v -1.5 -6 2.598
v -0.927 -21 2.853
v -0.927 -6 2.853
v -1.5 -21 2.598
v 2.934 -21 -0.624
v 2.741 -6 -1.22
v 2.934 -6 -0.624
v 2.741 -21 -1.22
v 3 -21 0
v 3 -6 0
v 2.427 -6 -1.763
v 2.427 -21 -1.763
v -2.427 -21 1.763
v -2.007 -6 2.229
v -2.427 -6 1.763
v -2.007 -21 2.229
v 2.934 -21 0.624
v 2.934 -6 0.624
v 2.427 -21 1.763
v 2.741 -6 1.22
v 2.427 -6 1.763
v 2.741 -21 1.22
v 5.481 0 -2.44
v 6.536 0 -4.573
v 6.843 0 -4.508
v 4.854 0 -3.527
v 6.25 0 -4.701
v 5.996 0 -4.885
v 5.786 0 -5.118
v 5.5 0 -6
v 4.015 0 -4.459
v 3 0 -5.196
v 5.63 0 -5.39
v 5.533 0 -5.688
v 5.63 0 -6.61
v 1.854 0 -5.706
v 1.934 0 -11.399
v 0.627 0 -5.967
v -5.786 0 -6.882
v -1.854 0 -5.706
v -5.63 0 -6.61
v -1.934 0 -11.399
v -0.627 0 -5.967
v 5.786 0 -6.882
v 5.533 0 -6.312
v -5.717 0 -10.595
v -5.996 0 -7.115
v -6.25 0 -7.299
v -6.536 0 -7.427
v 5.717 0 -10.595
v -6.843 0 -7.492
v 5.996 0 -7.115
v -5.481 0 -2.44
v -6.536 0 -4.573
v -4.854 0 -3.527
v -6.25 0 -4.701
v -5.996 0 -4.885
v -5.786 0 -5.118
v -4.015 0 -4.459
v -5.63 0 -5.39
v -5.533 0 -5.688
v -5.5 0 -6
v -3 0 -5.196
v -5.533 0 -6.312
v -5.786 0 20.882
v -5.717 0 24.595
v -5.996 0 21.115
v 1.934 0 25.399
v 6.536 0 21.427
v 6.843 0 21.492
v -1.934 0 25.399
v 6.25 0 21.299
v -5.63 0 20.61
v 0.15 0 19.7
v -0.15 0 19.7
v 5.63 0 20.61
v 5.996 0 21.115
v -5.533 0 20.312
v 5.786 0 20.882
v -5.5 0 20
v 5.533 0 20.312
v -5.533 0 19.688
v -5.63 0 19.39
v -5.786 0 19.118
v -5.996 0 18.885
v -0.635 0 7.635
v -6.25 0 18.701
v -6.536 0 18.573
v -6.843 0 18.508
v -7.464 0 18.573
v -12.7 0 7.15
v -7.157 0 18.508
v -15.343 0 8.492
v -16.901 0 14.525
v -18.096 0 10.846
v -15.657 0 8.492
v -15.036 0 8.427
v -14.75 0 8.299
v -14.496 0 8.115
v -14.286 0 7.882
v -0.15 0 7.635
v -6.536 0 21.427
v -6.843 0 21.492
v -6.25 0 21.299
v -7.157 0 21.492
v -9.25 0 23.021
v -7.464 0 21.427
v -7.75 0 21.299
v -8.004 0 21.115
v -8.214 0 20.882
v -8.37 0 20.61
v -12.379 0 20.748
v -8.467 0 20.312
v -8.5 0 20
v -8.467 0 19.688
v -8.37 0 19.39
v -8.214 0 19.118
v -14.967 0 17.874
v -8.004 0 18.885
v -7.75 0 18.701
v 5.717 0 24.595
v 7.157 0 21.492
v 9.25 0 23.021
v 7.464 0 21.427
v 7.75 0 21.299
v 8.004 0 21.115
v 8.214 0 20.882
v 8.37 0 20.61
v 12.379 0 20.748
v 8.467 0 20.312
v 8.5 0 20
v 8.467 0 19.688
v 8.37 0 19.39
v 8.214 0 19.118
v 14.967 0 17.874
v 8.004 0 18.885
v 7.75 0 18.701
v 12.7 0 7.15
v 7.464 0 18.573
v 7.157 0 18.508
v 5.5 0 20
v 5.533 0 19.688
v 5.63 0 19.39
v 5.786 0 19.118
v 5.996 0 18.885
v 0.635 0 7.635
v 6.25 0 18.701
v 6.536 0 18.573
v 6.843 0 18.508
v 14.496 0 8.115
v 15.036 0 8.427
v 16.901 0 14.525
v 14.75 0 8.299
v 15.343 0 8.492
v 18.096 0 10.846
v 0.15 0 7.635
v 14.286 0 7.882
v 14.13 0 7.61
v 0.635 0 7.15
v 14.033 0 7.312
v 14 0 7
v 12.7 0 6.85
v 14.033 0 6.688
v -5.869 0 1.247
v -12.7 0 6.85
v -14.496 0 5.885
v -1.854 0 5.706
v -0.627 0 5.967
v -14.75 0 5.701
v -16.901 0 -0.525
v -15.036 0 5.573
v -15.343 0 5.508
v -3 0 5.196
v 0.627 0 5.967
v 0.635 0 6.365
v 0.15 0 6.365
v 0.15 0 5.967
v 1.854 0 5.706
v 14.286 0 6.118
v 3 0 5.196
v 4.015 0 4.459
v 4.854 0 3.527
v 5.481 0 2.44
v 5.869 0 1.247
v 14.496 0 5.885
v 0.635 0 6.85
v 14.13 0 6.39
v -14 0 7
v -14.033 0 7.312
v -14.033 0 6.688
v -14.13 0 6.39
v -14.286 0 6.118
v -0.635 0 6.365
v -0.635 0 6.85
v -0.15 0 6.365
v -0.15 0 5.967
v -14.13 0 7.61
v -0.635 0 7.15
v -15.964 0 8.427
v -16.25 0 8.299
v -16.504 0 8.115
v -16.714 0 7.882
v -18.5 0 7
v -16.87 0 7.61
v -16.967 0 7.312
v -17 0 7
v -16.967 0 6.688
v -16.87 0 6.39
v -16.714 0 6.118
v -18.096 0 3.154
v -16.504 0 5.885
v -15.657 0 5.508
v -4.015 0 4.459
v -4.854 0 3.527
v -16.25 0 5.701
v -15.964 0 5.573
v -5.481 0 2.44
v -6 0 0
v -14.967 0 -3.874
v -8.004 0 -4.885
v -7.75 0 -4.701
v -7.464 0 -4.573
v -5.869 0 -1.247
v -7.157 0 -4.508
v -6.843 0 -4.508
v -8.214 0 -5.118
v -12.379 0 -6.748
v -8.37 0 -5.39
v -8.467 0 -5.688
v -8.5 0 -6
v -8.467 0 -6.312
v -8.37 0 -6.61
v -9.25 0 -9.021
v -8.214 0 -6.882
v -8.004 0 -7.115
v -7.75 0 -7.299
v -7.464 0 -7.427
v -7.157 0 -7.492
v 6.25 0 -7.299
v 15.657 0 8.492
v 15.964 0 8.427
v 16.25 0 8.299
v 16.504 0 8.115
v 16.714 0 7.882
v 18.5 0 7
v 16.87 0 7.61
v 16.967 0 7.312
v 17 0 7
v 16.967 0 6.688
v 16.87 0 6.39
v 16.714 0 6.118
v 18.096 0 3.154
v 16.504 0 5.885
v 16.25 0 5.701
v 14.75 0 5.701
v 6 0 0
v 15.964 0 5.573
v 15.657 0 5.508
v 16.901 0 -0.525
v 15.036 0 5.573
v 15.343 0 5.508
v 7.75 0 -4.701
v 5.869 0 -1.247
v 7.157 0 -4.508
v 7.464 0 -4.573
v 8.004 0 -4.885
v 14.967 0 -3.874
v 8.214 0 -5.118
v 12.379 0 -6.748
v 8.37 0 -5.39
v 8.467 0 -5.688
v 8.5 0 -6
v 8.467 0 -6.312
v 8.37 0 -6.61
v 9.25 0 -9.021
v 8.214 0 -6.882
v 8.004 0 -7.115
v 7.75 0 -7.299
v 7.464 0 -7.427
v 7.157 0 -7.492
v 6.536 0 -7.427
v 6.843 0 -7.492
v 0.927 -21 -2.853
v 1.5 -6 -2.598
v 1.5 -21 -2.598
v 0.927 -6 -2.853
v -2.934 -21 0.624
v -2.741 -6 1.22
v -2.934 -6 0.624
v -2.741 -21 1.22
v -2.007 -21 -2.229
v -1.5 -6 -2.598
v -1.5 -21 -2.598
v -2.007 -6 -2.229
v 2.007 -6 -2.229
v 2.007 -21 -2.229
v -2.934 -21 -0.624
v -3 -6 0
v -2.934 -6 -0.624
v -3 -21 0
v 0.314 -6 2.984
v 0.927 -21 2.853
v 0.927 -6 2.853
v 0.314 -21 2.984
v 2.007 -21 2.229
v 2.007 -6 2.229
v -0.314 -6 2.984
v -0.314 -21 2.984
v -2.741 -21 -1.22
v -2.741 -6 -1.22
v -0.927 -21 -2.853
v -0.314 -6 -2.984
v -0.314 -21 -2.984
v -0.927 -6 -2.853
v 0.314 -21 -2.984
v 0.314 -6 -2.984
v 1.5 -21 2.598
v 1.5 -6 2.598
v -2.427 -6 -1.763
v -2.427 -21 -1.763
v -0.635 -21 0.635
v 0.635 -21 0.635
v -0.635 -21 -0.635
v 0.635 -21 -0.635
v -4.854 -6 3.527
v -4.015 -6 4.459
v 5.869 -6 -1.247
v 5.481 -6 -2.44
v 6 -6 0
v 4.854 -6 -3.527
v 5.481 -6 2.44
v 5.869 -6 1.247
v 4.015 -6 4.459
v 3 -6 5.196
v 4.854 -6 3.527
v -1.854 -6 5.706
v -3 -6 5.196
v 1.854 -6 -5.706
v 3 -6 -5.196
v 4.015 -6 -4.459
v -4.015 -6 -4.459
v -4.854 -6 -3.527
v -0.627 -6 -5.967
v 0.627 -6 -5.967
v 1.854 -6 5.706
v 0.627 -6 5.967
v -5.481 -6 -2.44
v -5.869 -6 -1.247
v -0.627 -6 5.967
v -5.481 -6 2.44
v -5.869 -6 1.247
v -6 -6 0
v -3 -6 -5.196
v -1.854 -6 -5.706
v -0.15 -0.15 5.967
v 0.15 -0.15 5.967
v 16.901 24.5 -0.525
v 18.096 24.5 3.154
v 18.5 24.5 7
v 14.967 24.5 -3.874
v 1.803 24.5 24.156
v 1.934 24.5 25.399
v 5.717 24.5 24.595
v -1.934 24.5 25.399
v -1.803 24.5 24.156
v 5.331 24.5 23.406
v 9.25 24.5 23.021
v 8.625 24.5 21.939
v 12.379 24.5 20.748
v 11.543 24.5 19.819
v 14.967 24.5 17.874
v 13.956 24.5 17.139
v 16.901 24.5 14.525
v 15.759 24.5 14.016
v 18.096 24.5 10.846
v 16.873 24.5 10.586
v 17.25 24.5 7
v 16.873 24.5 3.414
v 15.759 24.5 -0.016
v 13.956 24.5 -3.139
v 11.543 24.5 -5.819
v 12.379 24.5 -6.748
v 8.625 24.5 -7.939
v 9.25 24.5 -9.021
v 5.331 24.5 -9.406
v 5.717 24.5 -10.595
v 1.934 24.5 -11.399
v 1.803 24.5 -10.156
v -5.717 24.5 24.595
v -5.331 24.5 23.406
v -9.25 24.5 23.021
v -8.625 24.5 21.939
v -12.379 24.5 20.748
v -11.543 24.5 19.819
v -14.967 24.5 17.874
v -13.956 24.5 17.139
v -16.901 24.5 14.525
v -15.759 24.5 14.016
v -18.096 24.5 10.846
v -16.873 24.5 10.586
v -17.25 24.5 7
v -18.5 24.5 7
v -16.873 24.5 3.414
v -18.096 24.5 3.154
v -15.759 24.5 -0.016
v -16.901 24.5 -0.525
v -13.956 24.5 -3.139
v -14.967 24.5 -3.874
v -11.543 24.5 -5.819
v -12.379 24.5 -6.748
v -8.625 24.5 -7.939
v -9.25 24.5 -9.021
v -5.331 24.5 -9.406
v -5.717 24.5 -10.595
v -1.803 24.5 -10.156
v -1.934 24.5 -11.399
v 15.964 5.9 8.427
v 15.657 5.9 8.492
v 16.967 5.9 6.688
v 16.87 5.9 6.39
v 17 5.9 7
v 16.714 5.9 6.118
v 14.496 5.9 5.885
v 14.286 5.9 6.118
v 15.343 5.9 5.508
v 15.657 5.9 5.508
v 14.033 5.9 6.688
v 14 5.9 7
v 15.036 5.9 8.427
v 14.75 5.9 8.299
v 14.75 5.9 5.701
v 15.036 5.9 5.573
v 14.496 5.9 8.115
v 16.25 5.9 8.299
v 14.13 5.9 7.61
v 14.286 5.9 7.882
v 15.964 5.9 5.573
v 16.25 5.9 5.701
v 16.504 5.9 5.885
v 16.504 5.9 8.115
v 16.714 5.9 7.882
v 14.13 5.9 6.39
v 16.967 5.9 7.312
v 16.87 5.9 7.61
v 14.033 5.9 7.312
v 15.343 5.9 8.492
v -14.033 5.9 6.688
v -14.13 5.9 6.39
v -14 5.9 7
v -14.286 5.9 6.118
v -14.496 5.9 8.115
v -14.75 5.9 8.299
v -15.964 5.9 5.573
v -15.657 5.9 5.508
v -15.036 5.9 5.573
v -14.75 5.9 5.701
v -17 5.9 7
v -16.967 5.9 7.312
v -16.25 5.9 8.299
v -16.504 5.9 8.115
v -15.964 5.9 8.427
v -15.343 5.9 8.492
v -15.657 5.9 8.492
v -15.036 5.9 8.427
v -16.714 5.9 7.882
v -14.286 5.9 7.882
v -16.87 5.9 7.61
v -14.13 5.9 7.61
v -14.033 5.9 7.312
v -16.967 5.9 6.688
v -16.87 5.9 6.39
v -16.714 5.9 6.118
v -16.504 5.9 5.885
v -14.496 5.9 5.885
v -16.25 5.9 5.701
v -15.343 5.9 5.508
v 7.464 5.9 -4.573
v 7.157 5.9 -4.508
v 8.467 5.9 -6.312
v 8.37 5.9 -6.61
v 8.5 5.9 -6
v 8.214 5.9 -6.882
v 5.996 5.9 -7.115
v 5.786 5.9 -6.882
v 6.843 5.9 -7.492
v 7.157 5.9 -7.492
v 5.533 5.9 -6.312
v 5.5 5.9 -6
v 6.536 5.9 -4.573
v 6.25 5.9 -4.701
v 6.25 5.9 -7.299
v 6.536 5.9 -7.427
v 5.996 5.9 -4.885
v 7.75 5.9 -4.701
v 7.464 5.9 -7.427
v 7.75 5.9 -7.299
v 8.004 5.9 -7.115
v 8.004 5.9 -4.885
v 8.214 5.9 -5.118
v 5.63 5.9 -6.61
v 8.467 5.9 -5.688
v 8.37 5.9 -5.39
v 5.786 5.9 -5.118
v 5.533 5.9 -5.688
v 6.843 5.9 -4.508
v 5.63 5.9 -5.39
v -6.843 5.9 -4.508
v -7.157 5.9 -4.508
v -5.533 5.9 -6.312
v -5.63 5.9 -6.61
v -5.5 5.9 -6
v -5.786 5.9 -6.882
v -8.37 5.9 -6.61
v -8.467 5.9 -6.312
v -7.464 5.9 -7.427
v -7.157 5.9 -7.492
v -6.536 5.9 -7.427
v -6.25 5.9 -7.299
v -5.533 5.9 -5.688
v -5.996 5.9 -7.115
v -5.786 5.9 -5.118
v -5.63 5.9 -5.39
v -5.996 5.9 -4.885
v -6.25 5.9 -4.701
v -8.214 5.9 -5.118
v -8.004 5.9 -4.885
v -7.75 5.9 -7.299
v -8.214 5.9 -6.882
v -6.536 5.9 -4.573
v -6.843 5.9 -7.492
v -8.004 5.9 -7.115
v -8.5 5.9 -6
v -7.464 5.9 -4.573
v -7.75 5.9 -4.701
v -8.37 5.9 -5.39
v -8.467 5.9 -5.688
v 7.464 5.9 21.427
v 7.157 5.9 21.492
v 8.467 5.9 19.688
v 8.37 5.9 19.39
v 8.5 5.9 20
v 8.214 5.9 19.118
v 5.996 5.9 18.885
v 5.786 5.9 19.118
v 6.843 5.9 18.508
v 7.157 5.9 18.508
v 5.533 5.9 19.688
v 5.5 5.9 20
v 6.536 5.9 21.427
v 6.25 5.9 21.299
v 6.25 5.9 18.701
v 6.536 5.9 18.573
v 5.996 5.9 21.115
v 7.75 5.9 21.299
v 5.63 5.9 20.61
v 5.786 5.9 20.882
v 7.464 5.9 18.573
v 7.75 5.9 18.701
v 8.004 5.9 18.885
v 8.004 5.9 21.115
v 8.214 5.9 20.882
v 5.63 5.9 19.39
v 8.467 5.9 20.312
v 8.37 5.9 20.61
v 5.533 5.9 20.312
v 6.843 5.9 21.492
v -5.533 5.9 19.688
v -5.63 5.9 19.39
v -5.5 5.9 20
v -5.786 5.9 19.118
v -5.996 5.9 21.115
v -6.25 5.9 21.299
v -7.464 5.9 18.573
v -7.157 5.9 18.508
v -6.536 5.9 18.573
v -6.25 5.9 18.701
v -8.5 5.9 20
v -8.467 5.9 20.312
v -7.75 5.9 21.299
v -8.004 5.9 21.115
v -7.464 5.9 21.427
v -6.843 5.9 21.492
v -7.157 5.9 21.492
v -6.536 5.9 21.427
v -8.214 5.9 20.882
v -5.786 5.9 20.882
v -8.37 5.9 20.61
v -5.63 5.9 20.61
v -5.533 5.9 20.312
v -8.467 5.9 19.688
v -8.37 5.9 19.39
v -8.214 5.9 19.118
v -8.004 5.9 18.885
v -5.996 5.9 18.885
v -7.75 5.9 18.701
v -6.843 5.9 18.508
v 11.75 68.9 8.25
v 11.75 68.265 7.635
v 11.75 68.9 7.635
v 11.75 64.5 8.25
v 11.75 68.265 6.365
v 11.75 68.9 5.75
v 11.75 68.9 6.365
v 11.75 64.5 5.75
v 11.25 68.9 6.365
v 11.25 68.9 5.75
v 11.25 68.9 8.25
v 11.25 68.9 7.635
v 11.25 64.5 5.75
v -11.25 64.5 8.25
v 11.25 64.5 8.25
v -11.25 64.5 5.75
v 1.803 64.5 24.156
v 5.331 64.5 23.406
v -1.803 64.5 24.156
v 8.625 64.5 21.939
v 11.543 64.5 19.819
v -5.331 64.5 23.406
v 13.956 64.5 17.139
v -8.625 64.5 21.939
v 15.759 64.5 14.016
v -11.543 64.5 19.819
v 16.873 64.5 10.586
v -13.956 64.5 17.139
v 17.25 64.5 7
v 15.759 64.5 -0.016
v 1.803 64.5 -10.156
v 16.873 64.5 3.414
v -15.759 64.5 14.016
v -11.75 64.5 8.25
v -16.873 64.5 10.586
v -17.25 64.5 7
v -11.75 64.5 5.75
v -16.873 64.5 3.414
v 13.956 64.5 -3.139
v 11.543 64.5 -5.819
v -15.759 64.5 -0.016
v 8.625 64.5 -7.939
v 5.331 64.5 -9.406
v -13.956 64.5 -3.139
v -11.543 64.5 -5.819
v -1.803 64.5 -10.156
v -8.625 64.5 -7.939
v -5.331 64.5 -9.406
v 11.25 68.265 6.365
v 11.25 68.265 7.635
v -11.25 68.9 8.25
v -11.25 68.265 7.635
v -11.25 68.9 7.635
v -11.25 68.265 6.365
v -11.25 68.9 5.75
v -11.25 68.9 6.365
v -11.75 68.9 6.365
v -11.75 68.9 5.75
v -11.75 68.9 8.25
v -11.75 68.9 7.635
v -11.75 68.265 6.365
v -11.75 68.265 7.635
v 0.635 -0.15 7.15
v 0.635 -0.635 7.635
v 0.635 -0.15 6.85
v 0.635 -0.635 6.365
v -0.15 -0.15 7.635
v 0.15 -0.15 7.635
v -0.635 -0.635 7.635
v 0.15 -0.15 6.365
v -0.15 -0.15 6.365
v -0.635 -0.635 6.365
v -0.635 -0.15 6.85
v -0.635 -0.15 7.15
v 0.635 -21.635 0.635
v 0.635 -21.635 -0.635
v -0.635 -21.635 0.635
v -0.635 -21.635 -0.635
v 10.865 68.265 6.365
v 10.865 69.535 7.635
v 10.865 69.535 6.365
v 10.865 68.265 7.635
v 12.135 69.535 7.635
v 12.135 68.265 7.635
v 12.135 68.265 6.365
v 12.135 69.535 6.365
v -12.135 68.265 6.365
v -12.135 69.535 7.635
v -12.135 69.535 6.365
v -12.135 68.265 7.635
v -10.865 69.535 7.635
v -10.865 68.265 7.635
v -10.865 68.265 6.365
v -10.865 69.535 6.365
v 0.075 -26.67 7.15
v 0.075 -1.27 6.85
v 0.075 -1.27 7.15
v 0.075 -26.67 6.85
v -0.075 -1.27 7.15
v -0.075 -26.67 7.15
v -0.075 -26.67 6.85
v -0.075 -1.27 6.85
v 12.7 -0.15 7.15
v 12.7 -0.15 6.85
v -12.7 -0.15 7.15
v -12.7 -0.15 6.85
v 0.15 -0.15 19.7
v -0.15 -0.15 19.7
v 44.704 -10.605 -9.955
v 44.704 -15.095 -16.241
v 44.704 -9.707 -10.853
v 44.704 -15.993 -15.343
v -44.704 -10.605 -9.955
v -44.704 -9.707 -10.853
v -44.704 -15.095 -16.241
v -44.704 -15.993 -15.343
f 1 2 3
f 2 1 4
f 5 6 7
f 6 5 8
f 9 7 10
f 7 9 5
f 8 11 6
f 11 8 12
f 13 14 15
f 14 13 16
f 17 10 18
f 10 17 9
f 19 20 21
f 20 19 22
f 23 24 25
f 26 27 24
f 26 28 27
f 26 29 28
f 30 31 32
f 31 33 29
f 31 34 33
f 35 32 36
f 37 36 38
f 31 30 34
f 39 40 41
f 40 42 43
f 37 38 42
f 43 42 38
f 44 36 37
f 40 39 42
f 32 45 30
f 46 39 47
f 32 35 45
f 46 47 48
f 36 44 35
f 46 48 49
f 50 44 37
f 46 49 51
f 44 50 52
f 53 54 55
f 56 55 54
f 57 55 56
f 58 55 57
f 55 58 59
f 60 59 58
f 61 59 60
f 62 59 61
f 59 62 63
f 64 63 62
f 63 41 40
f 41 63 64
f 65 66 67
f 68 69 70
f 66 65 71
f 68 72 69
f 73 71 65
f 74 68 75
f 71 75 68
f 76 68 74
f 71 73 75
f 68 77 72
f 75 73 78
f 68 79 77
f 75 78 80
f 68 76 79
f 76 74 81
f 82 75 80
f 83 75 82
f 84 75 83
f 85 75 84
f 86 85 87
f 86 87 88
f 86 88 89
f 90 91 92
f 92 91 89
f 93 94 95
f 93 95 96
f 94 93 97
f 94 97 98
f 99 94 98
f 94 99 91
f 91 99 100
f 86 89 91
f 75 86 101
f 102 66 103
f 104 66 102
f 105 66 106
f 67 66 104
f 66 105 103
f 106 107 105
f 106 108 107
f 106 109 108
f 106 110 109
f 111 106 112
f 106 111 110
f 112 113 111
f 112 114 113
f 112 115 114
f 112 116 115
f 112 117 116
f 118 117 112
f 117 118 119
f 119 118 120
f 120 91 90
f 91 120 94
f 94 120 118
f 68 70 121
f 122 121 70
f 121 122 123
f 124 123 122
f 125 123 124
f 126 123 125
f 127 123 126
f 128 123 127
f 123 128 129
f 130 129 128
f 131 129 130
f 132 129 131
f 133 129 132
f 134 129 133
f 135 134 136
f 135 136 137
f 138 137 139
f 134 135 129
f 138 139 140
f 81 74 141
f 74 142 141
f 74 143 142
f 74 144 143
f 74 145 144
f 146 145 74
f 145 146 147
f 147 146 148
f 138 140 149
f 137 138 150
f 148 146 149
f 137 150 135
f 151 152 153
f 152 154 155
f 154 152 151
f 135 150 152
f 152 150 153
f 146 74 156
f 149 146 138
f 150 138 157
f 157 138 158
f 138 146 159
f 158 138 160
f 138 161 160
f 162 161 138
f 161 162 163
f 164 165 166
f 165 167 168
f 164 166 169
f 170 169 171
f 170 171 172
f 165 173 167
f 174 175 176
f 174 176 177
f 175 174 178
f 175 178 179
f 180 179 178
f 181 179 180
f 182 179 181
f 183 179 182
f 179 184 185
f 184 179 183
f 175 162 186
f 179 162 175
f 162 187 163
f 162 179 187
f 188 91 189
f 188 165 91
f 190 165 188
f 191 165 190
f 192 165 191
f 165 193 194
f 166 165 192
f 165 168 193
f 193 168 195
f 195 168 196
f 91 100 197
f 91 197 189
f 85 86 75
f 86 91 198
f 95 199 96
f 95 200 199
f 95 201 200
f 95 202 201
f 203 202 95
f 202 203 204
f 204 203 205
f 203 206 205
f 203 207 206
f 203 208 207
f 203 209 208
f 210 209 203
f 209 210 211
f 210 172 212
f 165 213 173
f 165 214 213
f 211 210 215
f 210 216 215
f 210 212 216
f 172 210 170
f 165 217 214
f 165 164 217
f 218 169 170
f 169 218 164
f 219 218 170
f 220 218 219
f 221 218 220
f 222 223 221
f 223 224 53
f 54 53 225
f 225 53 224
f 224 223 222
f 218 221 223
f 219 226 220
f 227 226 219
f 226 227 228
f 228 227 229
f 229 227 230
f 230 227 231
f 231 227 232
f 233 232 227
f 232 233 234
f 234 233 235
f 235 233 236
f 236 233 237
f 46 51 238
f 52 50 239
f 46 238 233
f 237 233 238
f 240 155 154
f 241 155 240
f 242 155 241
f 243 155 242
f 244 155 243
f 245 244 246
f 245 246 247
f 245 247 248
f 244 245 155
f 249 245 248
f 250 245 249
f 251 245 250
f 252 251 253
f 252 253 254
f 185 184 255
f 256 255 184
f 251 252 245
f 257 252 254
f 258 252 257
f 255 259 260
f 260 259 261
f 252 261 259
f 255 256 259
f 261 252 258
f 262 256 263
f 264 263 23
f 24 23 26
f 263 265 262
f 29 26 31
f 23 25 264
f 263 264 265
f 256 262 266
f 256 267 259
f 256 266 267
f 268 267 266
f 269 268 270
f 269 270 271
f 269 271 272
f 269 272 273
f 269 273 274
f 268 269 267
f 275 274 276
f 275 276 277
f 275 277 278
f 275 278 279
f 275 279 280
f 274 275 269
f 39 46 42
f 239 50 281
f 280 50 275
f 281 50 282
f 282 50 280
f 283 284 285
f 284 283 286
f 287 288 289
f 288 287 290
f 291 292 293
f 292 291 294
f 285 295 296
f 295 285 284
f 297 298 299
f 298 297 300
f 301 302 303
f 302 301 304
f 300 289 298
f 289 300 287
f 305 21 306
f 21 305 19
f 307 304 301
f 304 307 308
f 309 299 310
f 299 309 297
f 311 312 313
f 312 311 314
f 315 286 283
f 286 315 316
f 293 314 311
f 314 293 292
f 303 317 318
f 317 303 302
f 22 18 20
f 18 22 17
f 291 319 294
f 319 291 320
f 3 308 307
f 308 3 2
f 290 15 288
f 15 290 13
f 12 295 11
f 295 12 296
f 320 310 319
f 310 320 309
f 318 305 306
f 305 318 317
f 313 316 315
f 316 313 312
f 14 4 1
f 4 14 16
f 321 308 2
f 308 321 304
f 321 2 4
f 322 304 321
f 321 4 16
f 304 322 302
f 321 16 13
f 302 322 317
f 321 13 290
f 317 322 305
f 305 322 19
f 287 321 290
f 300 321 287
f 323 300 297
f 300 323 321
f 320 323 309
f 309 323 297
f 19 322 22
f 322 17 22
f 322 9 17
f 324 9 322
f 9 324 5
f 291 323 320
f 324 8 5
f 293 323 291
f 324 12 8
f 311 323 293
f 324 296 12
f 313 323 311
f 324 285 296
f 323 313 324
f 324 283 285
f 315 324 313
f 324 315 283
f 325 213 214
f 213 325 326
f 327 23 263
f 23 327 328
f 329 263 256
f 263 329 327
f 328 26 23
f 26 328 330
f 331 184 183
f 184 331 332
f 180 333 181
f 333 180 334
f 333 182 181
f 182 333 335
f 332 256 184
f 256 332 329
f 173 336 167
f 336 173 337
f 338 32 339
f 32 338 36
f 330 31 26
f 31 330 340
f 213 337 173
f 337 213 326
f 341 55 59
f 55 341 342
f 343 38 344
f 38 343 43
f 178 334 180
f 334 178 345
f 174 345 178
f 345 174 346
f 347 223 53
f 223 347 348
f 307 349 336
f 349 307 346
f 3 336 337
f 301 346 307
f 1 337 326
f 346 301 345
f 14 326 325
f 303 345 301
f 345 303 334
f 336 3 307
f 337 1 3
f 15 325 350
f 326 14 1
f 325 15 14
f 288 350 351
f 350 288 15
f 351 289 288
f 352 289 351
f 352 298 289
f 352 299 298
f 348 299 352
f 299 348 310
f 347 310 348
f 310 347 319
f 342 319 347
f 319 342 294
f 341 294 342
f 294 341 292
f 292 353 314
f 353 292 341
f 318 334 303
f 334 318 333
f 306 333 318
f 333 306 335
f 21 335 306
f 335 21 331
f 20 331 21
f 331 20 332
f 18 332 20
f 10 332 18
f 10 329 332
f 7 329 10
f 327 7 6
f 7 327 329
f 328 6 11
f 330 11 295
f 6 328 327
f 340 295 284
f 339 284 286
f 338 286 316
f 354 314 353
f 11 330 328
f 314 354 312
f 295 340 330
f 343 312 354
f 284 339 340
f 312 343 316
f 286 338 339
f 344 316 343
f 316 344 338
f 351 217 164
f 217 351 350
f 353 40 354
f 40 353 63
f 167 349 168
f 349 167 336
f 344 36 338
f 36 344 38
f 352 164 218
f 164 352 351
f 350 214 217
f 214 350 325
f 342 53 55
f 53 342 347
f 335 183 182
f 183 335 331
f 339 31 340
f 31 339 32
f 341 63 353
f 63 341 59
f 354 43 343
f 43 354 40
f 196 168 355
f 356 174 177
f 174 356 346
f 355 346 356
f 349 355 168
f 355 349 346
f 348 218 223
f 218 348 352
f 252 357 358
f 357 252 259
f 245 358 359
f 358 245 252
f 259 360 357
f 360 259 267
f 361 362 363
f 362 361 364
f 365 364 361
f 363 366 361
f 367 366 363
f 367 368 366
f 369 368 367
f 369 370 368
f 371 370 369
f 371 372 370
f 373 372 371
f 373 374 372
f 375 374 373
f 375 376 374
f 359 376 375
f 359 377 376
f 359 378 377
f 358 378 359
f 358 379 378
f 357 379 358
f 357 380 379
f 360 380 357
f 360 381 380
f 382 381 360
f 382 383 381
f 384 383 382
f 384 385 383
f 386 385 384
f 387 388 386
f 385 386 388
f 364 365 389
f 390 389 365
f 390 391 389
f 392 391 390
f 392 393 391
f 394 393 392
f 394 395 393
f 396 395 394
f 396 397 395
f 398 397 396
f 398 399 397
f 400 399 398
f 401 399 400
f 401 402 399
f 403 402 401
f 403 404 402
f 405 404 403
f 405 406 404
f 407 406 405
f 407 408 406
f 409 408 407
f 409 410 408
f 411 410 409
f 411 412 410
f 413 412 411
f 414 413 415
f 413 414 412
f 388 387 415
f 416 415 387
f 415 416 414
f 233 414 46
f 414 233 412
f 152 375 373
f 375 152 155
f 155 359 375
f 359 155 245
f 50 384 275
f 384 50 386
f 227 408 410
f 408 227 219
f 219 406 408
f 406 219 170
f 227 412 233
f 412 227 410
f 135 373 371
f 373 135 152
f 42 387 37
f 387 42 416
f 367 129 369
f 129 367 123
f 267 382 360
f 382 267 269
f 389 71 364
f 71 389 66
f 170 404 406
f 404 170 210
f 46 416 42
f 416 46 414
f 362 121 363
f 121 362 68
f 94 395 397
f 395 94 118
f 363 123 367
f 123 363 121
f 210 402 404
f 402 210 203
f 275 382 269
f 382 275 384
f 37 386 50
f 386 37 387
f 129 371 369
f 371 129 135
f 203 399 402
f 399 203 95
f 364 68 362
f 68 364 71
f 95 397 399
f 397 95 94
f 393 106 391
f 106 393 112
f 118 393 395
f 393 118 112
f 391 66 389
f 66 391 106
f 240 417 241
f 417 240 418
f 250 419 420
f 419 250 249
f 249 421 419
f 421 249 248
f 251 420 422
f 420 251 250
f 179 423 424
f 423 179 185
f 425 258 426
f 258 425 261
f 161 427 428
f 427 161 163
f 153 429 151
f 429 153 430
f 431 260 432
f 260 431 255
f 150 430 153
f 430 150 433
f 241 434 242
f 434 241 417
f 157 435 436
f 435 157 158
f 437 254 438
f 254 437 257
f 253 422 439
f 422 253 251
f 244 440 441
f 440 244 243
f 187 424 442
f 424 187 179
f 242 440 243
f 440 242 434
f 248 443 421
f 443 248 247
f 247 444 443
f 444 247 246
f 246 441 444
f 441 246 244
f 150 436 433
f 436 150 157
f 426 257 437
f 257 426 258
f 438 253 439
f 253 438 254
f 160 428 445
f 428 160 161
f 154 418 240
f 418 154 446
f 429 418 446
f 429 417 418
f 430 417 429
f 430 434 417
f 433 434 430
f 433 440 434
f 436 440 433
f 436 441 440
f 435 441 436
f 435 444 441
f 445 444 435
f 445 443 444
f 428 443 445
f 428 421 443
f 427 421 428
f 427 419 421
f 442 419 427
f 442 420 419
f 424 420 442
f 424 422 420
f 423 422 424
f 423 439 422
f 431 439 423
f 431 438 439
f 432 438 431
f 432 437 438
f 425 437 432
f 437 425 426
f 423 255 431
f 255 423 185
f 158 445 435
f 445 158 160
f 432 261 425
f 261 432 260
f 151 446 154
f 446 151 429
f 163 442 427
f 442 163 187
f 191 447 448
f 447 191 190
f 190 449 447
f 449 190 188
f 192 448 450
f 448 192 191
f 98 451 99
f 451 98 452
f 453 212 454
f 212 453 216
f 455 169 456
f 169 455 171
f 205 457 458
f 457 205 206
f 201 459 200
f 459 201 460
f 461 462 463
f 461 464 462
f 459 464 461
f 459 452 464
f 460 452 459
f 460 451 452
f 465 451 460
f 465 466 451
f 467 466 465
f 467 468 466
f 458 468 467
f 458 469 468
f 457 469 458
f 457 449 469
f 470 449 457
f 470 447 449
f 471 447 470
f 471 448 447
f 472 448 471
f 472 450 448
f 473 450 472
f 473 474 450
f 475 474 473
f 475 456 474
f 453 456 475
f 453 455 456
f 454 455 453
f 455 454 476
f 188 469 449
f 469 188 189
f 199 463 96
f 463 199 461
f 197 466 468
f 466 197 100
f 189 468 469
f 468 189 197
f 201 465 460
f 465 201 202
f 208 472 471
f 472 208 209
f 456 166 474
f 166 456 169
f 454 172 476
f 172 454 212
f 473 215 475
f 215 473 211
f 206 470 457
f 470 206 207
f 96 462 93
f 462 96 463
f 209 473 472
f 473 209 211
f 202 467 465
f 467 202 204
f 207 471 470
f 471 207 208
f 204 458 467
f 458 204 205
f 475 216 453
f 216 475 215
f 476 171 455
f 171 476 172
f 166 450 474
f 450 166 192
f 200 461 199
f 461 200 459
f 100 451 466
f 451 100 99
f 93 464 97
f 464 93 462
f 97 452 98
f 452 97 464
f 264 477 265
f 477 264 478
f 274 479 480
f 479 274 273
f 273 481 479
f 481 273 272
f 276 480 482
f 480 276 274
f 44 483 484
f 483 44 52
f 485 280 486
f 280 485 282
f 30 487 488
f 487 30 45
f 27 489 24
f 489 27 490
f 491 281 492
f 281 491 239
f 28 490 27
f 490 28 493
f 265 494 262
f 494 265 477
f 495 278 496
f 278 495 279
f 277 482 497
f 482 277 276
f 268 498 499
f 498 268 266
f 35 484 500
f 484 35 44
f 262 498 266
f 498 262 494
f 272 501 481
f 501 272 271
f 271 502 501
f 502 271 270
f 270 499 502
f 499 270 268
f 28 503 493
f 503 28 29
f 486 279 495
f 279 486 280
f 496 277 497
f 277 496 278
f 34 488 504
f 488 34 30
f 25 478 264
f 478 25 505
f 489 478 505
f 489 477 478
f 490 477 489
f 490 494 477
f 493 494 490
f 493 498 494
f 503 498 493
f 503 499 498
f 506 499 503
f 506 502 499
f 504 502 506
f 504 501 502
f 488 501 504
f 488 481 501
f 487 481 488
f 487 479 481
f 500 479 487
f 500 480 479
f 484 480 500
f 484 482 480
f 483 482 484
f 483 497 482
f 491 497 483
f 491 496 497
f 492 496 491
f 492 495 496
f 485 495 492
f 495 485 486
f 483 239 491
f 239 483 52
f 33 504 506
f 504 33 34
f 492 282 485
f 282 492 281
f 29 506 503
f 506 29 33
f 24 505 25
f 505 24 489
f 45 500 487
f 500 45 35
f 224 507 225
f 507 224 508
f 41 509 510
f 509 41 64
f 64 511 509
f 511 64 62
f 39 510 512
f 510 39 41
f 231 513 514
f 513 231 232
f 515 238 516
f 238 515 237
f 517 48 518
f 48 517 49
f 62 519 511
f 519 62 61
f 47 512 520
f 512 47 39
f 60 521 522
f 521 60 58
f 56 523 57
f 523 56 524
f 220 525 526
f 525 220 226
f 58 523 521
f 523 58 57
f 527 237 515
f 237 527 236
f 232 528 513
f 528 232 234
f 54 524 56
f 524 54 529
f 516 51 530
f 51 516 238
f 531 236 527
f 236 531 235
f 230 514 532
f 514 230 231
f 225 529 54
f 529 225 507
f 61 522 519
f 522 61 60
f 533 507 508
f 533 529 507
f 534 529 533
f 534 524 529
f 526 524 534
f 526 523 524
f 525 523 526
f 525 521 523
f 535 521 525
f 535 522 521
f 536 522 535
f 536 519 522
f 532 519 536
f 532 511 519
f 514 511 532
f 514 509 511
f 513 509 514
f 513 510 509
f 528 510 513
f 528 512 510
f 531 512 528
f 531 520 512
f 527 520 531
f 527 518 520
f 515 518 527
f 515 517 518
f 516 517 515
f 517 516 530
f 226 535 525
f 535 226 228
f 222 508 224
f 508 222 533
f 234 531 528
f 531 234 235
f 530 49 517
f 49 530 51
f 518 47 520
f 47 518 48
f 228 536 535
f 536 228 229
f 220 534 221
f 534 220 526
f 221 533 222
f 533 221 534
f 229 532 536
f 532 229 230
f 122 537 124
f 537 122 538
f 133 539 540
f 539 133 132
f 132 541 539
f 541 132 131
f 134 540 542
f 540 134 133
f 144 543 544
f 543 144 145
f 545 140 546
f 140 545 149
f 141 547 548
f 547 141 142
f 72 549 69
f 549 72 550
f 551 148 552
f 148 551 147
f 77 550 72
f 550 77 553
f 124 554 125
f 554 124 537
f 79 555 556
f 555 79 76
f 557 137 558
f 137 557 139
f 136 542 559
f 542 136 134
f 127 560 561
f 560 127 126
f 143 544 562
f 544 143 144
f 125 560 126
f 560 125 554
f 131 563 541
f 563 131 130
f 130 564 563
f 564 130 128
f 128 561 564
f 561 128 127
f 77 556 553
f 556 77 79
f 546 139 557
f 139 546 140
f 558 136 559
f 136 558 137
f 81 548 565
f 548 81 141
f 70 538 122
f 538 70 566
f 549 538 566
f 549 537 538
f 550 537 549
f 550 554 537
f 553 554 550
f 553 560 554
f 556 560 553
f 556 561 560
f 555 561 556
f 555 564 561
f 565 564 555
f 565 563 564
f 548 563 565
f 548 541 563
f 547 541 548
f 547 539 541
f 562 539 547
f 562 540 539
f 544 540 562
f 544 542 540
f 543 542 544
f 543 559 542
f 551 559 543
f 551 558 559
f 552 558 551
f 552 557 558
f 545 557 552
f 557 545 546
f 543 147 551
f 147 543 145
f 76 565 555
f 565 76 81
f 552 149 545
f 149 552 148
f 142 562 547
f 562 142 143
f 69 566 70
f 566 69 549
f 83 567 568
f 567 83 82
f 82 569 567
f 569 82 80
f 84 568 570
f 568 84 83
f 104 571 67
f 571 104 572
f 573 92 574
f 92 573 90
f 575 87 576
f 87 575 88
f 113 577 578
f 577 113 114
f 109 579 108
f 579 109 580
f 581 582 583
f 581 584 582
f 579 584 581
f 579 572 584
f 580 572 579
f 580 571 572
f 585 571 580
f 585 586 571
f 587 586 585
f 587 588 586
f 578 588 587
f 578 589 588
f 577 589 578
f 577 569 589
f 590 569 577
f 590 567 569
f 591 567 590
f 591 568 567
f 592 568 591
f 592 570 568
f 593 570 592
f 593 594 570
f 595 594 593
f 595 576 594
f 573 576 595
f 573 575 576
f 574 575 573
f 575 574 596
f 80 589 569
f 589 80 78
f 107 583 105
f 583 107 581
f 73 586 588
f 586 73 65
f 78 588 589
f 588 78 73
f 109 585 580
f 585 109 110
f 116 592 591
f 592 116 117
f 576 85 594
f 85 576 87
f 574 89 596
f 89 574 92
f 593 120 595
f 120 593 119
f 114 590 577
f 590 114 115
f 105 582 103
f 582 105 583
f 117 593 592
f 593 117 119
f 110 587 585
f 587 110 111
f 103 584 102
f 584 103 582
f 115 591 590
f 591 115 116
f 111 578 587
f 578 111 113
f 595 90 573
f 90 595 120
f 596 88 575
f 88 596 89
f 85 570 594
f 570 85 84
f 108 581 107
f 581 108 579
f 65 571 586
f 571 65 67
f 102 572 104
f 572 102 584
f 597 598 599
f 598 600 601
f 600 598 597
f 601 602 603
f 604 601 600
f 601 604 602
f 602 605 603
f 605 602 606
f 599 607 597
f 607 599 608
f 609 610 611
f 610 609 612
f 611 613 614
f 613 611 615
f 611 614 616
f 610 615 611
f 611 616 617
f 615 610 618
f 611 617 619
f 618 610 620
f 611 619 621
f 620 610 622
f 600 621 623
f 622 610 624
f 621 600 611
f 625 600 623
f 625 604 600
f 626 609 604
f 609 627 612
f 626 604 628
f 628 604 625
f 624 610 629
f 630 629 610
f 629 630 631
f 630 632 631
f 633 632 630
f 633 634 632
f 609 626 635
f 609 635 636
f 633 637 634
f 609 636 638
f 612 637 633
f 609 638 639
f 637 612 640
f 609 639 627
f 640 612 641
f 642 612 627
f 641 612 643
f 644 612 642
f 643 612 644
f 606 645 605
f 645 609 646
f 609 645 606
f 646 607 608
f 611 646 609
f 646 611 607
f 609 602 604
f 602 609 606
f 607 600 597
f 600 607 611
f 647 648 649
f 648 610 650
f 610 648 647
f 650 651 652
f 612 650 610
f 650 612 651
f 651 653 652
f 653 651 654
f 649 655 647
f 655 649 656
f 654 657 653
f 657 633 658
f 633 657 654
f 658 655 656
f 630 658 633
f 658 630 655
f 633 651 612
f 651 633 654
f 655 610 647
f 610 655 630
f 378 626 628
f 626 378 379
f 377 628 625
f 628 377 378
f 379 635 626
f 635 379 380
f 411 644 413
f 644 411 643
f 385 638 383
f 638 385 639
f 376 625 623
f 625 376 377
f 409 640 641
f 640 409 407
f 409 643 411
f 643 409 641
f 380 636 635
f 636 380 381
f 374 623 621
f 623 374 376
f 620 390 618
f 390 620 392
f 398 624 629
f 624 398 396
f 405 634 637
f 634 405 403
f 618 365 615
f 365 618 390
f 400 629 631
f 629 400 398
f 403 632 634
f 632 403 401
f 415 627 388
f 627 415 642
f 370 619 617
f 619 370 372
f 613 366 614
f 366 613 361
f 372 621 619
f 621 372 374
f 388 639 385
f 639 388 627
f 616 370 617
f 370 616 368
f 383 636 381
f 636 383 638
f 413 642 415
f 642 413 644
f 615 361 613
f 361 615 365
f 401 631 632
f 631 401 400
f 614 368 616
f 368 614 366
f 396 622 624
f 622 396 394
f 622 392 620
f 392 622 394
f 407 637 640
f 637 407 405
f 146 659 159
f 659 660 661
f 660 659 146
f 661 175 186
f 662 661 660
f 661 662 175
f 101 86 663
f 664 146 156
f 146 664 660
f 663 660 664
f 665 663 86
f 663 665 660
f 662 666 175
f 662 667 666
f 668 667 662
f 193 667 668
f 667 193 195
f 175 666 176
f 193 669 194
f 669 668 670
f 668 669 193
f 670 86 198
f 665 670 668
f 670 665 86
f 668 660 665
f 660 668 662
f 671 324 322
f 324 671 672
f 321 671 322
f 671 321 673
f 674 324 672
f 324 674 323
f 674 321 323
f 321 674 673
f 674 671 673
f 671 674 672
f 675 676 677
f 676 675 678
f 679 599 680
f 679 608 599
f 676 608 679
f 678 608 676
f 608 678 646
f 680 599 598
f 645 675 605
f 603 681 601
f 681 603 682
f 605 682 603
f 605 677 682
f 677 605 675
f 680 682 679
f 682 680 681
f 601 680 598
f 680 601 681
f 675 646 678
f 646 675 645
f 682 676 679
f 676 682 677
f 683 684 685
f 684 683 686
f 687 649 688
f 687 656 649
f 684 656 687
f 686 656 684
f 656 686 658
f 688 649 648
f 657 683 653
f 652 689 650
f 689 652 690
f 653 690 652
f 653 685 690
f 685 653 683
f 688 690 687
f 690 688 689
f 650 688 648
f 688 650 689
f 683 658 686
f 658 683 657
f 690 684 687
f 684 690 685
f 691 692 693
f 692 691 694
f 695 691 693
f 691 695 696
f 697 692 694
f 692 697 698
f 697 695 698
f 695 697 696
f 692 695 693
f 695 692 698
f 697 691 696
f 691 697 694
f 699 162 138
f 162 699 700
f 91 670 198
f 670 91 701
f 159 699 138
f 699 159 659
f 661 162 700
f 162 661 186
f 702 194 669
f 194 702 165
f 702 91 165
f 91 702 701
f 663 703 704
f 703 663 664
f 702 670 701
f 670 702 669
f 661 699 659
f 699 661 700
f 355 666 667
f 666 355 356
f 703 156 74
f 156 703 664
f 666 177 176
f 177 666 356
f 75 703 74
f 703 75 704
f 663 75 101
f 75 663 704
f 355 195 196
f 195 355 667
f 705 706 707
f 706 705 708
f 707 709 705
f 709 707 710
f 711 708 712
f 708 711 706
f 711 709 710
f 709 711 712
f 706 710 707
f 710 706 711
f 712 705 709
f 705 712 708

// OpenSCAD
include <../mo/mo.scad>

motorShaftOffset = 7;
motorShaftDepth = 21;
motorShaftDiameter = 6;
motorGearShoulderDepth = 6;
motorGearShoulderDiameter = 12;
motorGearDepth = 24.5;
motorGearDiameter = 37;
motorMotorDepth = 40;
motorMotorDiameter = 34.5;
motorMotorCapDepth = 2;
motorMotorCapDiameter = 21.6;
motorMotorEndCapDepth = 2;
motorMotorEndCapDiameter = 8;
motorConnectorDepth = 4.4;
motorConnectorWidth = 0.5;
motorConnectorHeight = 2.5;
motorMountScrewCircle = 31;
motorMountScrewDiameter = 3;
motorMountScrewX = 7;
motorMountScrewZ = 13; // guestimating
motorMountScrewDepth = 6;

motorBodyLength = motorGearDepth+motorMotorDepth+motorConnectorDepth;

positions = [
  [ [ 0, 0, 0 ], [ 0, 0, 1 ], 0 ],
  [ [ 0, 0, -motorShaftOffset ], [ 0, 0, 1 ], 0 ],
  [ [ 0, -motorShaftDepth, -motorShaftOffset ], [ 0, 0, 1 ], 0 ],
  [ [ 0, -motorGearShoulderDepth, -motorShaftOffset ], [ 0, 0, 1 ], 0 ],
  [ [ motorMotorDiameter/3, motorBodyLength, 0 ], [ 0, 0, 1 ], 180 ],
  [ [ -motorMotorDiameter/3, motorBodyLength, 0 ], [ 0, 0, 1 ], 180 ],
];

module actGearMotorPrecision( p = 0, info = false ) {
  moPresent( positions, p, info )
    rotate( [-90,0,0] ){
      color( Steel ) {
        translate( [ 0, motorShaftOffset, 0 ] ) {
          translate([0,0,-motorShaftDepth/2])
            cylinder( h = motorShaftDepth, r = motorShaftDiameter/2, center = true  );
          translate([0,0,-motorGearShoulderDepth/2])
            cylinder( h = motorGearShoulderDepth, r = motorGearShoulderDiameter/2, center = true  );
        }
        translate([0,0,motorGearDepth/2]) {
          difference() 
          {
            cylinder( h = motorGearDepth, r = motorGearDiameter/2, center = true  );      
            translate( [ motorMountScrewCircle/2, 0, -motorGearDepth/2+motorMountScrewDepth / 2 - Epsilon ] )
              cylinder( h = motorMountScrewDepth, d = motorMountScrewDiameter, center = true  );      
            translate( [ -motorMountScrewCircle/2, 0, -motorGearDepth/2+motorMountScrewDepth / 2 - Epsilon ] )
              cylinder( h = motorMountScrewDepth, d = motorMountScrewDiameter, center = true  );      

            translate( [ motorMountScrewX, motorMountScrewZ, -motorGearDepth/2+motorMountScrewDepth / 2 - Epsilon ] )
              cylinder( h = motorMountScrewDepth, d = motorMountScrewDiameter, center = true  );      
            translate( [ -motorMountScrewX, motorMountScrewZ, -motorGearDepth/2+motorMountScrewDepth / 2 - Epsilon ] )
              cylinder( h = motorMountScrewDepth, d = motorMountScrewDiameter, center = true  );      
            
            translate( [ motorMountScrewX, -motorMountScrewZ, -motorGearDepth/2+motorMountScrewDepth / 2 - Epsilon ] )
              cylinder( h = motorMountScrewDepth, d = motorMountScrewDiameter, center = true  );      
            translate( [ -motorMountScrewX, -motorMountScrewZ, -motorGearDepth/2+motorMountScrewDepth / 2 - Epsilon ] )
              cylinder( h = motorMountScrewDepth, d = motorMountScrewDiameter, center = true  );      

          }
        }
        translate([motorMotorDiameter/3,0,motorGearDepth+motorMotorDepth+motorConnectorDepth/2])
          cube( [ motorConnectorWidth, motorConnectorHeight, motorConnectorDepth ], center = true  );
        translate([-motorMotorDiameter/3,0,motorGearDepth+motorMotorDepth+motorConnectorDepth/2])
          cube( [ motorConnectorWidth, motorConnectorHeight, motorConnectorDepth ], center = true  );
      }
      color( Brass ) {
        translate([0,0,motorGearDepth+motorMotorDepth/2])
          cylinder( h = motorMotorDepth, r = motorMotorDiameter/2, center = true  );
      }
   } 
}

function actGearMotorPrecisionPosition( p = 0 ) = positions[ p ];

moMoveOriginTo( actGearMotorPrecisionPosition( 1 ) )
  actGearMotorPrecision( 0, info = true, $name = true );
